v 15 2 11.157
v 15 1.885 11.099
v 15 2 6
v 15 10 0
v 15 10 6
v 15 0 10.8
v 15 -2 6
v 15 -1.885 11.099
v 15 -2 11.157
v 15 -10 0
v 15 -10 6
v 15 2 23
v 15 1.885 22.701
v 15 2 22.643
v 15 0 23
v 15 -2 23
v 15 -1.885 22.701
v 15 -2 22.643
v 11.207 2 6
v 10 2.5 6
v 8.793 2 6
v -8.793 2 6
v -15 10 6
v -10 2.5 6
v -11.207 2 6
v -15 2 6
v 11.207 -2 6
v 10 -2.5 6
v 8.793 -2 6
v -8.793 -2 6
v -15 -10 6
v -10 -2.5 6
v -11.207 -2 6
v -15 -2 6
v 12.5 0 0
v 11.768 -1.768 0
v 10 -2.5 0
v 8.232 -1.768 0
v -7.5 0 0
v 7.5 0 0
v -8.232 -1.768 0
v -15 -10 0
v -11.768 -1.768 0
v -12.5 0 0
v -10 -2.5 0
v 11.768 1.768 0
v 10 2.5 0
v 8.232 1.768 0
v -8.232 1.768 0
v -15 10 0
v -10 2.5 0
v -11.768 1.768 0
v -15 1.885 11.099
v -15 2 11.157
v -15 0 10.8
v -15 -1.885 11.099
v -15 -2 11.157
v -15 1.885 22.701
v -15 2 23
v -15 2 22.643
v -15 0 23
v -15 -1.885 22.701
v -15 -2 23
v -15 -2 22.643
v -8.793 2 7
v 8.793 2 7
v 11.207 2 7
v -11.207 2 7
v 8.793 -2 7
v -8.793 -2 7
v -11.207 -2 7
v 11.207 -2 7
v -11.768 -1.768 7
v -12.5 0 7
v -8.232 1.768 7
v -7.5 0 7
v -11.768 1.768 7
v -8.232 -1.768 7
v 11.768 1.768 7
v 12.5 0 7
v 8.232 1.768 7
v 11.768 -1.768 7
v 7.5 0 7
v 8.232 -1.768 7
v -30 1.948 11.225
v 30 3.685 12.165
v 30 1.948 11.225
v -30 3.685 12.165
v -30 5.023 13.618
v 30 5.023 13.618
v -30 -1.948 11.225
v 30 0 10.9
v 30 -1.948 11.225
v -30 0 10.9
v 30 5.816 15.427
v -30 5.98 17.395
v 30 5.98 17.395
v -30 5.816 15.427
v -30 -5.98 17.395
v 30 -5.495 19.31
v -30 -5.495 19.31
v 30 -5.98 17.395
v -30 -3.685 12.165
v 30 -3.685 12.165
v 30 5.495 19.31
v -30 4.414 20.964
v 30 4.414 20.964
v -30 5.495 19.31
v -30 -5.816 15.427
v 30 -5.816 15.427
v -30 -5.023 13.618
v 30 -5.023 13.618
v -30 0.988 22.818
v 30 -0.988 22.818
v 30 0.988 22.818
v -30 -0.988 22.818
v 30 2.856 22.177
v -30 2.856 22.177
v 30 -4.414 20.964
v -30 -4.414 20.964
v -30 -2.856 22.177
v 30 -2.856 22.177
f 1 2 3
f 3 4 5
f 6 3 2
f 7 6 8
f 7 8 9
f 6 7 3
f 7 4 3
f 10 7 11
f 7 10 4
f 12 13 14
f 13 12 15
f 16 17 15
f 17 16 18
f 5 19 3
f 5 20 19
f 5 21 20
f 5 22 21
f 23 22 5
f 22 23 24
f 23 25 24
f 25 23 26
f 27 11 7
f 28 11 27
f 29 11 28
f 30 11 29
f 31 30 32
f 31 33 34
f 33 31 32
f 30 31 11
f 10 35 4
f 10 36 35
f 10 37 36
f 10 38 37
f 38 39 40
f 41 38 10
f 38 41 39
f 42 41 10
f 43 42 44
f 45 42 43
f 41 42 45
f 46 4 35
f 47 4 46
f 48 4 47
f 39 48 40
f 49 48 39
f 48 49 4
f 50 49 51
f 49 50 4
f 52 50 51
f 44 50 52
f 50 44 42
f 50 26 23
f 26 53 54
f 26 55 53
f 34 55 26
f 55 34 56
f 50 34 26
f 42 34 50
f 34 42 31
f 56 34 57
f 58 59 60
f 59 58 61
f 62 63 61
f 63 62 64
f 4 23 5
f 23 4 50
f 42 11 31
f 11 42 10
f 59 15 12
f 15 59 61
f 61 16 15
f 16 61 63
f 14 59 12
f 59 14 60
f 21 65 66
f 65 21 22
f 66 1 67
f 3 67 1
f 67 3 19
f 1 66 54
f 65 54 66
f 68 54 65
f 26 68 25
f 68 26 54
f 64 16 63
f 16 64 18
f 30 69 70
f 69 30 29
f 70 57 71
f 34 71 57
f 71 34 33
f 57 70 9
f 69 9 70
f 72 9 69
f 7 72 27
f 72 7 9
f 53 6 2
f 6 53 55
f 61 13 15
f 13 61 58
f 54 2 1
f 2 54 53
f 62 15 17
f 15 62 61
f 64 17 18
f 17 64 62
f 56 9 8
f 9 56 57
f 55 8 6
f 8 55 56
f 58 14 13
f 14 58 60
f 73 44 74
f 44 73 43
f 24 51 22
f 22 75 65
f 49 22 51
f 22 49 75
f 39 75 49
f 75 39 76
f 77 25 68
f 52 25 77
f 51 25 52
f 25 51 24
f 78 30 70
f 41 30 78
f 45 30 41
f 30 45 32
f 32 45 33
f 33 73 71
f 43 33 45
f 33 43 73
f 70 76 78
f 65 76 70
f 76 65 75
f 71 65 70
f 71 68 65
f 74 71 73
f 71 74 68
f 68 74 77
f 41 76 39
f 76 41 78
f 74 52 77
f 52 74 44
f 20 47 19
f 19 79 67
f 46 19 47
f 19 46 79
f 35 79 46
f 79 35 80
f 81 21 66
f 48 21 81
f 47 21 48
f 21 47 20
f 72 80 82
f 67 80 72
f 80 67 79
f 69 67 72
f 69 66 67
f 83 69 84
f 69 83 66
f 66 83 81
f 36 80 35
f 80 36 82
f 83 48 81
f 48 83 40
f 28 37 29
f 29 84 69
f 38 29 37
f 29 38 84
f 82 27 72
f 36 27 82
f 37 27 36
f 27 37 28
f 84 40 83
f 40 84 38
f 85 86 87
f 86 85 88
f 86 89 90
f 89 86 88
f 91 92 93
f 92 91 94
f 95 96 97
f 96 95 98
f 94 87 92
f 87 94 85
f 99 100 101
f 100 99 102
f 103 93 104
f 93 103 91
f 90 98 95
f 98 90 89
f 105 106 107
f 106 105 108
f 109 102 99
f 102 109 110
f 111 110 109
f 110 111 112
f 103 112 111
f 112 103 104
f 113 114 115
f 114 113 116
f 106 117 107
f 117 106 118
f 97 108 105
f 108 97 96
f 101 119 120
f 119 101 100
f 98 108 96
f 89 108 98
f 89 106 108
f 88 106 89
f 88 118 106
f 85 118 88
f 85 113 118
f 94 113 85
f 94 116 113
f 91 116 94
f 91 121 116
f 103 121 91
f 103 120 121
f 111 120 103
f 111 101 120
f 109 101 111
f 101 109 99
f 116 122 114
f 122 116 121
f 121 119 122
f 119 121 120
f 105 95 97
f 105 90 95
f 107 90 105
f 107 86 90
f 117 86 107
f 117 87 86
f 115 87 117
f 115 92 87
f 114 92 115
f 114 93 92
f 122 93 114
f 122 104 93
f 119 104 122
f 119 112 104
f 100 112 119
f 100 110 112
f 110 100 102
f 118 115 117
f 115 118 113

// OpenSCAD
// Parameters
rod_diameter_mm = 12.0; //[6.0:24.0:0.1]
rod_length_mm = 60.0; //[30.0:120.0:1]
overall_height_mm = 23.0; //[12.0:46.0:0.1]
bracket_width_mm = 30.0; //[15.0:60.0:0.5]
bracket_depth_mm = 20.0; //[10.0:40.0:0.5]
base_thickness_mm = 6.0; //[3.0:12.0:0.1]
wall_thickness_mm = 4.0; //[2.0:8.0:0.1]
rod_clearance_mm = 0.2; //[0.0:0.8:0.05]
mount_hole_diameter_mm = 5.0; //[3.0:8.0:0.1]
mount_hole_spacing_mm = 20.0; //[10.0:40.0:0.5]
mount_hole_edge_margin_mm = 5.0; //[2.0:10.0:0.5]
fillet_radius_mm = 2.0; //[0.5:4.0:0.1]
overlap_mm = 1.0; //[0.5:2.0:0.1]

// Rod - complete geometry
module rod() {
  color("Silver") {
    translate([0, 0, overall_height_mm - (rod_diameter_mm + rod_clearance_mm) / 2])
      rotate([0, 90, 0])
      cylinder(r=rod_diameter_mm / 2, h=rod_length_mm, center=true);
  }
}

// Bracket - complete geometry
module bracket() {
  color("Silver") {
    difference() {
      union() {
        // Mounting base
        translate([0, 0, base_thickness_mm / 2])
          cube([bracket_width_mm, bracket_depth_mm, base_thickness_mm], center=true);
        
        // Support body
        translate([0, 0, base_thickness_mm + (overall_height_mm - base_thickness_mm) / 2])
          cube([bracket_width_mm, wall_thickness_mm, overall_height_mm - base_thickness_mm], center=true);
        
        // Fillet gussets
        hull() {
          translate([-(bracket_width_mm / 2 - fillet_radius_mm), 0, base_thickness_mm + fillet_radius_mm])
            sphere(r=fillet_radius_mm);
          translate([-(bracket_width_mm / 2 - fillet_radius_mm), 0, base_thickness_mm + (overall_height_mm - base_thickness_mm) / 2])
            sphere(r=fillet_radius_mm);
        }
        hull() {
          translate([(bracket_width_mm / 2 - fillet_radius_mm), 0, base_thickness_mm + fillet_radius_mm])
            sphere(r=fillet_radius_mm);
          translate([(bracket_width_mm / 2 - fillet_radius_mm), 0, base_thickness_mm + (overall_height_mm - base_thickness_mm) / 2])
            sphere(r=fillet_radius_mm);
        }
      }
      
      // Rod bore or cradle
      translate([0, 0, overall_height_mm - (rod_diameter_mm + rod_clearance_mm) / 2])
        rotate([0, 90, 0])
        cylinder(r=(rod_diameter_mm + rod_clearance_mm) / 2, h=bracket_width_mm + 2 * overlap_mm, center=true);
      
      // Mounting holes
      translate([-mount_hole_spacing_mm / 2, 0, base_thickness_mm / 2])
        cylinder(r=mount_hole_diameter_mm / 2, h=base_thickness_mm + 2 * overlap_mm, center=true);
      translate([mount_hole_spacing_mm / 2, 0, base_thickness_mm / 2])
        cylinder(r=mount_hole_diameter_mm / 2, h=base_thickness_mm + 2 * overlap_mm, center=true);
    }
  }
}

// Assembly
module assembly() {
  bracket();
  rod();
}

assembly();
